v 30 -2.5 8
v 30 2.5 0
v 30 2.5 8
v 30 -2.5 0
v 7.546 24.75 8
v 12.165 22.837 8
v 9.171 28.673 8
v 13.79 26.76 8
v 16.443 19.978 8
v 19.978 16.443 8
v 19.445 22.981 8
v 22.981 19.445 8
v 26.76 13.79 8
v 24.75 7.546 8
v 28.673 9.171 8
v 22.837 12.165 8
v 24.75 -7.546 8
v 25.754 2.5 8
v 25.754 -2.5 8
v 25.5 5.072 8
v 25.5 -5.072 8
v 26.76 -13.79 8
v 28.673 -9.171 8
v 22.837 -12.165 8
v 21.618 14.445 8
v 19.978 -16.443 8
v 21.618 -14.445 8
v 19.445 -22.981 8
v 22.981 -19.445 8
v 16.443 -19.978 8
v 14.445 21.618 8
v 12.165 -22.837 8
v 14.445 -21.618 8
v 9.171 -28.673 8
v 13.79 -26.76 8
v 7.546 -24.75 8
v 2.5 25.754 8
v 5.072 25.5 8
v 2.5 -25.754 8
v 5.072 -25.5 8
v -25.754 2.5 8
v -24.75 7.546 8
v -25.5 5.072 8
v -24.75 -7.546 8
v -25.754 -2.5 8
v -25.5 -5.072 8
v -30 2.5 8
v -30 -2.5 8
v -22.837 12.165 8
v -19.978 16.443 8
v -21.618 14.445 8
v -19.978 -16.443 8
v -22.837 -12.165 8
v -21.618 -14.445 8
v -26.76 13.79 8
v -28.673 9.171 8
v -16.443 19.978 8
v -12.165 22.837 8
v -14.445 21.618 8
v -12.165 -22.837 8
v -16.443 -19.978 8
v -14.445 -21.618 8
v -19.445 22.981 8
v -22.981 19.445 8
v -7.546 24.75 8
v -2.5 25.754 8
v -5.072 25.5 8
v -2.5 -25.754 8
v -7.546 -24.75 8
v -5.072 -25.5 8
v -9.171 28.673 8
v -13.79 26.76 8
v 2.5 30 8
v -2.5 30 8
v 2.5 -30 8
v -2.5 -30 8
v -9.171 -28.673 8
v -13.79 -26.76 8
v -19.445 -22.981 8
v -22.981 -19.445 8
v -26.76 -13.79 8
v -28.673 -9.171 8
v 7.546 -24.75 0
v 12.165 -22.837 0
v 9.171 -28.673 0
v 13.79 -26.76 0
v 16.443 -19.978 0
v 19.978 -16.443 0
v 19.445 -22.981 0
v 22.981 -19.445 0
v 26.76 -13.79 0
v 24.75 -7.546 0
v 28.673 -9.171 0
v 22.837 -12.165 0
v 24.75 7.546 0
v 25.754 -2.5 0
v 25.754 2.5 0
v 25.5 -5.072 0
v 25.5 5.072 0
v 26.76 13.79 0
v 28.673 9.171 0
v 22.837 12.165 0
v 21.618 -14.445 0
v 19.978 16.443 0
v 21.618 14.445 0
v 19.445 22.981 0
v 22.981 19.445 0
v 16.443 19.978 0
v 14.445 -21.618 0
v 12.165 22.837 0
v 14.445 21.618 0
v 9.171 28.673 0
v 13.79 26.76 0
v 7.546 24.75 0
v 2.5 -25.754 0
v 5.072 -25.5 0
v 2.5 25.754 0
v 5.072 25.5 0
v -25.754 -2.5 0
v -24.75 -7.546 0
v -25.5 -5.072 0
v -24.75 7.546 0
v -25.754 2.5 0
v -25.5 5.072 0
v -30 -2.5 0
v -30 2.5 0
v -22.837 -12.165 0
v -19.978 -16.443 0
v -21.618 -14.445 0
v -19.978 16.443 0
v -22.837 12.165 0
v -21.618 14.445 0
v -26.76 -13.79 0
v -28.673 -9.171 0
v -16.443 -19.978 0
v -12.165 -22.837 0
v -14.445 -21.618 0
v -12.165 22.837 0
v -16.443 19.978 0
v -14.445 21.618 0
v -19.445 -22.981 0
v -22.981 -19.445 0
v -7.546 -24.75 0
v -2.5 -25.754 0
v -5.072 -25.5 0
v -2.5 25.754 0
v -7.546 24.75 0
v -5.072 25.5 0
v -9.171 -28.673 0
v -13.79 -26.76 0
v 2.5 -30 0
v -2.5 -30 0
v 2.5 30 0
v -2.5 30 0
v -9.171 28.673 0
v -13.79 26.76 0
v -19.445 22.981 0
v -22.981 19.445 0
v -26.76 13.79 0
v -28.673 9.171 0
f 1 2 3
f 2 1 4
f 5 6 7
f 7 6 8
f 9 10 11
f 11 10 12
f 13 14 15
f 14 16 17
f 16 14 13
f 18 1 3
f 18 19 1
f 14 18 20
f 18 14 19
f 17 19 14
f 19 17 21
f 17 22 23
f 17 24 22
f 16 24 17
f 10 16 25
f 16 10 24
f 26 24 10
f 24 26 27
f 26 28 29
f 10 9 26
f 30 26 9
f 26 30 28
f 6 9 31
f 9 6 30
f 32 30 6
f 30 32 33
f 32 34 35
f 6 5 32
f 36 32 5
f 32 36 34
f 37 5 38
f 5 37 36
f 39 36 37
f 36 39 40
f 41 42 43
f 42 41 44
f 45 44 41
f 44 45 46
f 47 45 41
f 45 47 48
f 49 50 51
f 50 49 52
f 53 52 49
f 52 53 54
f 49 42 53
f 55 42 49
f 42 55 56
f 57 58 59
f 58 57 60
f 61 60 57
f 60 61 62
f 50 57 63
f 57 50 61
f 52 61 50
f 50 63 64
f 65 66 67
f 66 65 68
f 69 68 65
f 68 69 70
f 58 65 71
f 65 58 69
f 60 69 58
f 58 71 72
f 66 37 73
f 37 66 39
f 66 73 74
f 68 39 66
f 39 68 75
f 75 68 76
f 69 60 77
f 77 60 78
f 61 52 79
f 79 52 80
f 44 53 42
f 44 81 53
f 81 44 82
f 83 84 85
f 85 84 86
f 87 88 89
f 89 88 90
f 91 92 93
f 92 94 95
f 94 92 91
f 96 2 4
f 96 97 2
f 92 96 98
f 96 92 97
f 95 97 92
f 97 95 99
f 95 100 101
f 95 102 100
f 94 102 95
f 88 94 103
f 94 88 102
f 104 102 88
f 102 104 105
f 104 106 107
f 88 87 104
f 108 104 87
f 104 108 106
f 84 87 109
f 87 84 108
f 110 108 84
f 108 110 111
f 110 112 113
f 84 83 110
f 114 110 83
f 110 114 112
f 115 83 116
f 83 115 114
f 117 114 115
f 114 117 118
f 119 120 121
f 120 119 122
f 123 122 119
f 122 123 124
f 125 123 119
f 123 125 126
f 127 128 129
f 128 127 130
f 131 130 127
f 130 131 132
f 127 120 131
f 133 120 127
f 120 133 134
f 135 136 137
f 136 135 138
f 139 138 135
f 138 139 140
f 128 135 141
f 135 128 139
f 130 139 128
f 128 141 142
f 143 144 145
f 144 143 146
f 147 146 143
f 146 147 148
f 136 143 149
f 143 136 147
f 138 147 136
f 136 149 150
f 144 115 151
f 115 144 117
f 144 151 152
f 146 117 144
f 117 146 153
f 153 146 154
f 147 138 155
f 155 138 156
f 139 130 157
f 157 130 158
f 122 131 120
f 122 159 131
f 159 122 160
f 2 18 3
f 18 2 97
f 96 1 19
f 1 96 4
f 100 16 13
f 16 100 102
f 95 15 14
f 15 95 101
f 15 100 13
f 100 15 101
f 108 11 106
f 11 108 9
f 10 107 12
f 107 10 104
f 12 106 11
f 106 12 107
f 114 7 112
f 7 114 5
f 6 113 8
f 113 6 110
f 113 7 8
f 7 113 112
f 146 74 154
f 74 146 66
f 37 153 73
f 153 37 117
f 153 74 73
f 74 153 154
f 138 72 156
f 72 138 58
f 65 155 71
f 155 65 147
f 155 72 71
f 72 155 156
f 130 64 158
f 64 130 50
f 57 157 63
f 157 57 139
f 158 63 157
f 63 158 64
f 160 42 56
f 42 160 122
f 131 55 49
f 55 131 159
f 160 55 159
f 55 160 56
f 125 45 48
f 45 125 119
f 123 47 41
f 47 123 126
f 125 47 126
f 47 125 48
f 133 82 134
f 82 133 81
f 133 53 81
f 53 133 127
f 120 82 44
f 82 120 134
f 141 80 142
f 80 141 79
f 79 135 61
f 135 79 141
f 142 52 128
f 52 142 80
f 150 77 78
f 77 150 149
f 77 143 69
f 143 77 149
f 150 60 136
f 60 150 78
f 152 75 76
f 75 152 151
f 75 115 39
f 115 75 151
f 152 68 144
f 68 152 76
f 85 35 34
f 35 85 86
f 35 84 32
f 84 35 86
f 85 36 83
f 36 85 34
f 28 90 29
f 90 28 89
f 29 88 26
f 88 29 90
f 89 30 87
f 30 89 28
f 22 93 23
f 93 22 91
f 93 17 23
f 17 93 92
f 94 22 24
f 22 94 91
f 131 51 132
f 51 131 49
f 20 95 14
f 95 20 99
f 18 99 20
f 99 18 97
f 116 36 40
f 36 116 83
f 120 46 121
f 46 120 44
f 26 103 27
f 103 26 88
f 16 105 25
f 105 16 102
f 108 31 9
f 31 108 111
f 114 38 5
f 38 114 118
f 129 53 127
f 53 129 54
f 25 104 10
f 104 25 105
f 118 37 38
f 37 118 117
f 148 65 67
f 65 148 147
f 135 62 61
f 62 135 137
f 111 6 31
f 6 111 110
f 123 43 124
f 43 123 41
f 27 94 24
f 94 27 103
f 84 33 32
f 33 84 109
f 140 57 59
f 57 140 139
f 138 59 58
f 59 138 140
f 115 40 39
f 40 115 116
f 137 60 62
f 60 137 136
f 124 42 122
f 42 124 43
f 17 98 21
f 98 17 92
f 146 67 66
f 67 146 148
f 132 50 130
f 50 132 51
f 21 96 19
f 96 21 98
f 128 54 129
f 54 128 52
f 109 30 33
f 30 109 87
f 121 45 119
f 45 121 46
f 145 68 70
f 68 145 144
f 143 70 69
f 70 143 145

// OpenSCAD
$fn = 32;

// ----------------------------------------------------------------------
// Spur blank: plain gear blank
// ----------------------------------------------------------------------

// --- parameters (mm) ---
disc_r = 26;              // blank root radius
disc_t = 8;               // blank thickness
n_teeth = 16;             // stub tooth count
tooth_w = 5;              // tooth width at the root
tooth_h = 4;              // tooth height above the root

out_r = disc_r + tooth_h;  // tip radius
bbox_x = 60.0;  // measured width over the teeth
bbox_y = 60.0;  // measured depth over the teeth

union() {
  cylinder(r = disc_r, h = disc_t);
  for (i = [0 : n_teeth - 1])
    rotate([0, 0, i * 360 / n_teeth])
      translate([disc_r - 1, -tooth_w / 2, 0])
        cube([tooth_h + 1, tooth_w, disc_t]);
}
